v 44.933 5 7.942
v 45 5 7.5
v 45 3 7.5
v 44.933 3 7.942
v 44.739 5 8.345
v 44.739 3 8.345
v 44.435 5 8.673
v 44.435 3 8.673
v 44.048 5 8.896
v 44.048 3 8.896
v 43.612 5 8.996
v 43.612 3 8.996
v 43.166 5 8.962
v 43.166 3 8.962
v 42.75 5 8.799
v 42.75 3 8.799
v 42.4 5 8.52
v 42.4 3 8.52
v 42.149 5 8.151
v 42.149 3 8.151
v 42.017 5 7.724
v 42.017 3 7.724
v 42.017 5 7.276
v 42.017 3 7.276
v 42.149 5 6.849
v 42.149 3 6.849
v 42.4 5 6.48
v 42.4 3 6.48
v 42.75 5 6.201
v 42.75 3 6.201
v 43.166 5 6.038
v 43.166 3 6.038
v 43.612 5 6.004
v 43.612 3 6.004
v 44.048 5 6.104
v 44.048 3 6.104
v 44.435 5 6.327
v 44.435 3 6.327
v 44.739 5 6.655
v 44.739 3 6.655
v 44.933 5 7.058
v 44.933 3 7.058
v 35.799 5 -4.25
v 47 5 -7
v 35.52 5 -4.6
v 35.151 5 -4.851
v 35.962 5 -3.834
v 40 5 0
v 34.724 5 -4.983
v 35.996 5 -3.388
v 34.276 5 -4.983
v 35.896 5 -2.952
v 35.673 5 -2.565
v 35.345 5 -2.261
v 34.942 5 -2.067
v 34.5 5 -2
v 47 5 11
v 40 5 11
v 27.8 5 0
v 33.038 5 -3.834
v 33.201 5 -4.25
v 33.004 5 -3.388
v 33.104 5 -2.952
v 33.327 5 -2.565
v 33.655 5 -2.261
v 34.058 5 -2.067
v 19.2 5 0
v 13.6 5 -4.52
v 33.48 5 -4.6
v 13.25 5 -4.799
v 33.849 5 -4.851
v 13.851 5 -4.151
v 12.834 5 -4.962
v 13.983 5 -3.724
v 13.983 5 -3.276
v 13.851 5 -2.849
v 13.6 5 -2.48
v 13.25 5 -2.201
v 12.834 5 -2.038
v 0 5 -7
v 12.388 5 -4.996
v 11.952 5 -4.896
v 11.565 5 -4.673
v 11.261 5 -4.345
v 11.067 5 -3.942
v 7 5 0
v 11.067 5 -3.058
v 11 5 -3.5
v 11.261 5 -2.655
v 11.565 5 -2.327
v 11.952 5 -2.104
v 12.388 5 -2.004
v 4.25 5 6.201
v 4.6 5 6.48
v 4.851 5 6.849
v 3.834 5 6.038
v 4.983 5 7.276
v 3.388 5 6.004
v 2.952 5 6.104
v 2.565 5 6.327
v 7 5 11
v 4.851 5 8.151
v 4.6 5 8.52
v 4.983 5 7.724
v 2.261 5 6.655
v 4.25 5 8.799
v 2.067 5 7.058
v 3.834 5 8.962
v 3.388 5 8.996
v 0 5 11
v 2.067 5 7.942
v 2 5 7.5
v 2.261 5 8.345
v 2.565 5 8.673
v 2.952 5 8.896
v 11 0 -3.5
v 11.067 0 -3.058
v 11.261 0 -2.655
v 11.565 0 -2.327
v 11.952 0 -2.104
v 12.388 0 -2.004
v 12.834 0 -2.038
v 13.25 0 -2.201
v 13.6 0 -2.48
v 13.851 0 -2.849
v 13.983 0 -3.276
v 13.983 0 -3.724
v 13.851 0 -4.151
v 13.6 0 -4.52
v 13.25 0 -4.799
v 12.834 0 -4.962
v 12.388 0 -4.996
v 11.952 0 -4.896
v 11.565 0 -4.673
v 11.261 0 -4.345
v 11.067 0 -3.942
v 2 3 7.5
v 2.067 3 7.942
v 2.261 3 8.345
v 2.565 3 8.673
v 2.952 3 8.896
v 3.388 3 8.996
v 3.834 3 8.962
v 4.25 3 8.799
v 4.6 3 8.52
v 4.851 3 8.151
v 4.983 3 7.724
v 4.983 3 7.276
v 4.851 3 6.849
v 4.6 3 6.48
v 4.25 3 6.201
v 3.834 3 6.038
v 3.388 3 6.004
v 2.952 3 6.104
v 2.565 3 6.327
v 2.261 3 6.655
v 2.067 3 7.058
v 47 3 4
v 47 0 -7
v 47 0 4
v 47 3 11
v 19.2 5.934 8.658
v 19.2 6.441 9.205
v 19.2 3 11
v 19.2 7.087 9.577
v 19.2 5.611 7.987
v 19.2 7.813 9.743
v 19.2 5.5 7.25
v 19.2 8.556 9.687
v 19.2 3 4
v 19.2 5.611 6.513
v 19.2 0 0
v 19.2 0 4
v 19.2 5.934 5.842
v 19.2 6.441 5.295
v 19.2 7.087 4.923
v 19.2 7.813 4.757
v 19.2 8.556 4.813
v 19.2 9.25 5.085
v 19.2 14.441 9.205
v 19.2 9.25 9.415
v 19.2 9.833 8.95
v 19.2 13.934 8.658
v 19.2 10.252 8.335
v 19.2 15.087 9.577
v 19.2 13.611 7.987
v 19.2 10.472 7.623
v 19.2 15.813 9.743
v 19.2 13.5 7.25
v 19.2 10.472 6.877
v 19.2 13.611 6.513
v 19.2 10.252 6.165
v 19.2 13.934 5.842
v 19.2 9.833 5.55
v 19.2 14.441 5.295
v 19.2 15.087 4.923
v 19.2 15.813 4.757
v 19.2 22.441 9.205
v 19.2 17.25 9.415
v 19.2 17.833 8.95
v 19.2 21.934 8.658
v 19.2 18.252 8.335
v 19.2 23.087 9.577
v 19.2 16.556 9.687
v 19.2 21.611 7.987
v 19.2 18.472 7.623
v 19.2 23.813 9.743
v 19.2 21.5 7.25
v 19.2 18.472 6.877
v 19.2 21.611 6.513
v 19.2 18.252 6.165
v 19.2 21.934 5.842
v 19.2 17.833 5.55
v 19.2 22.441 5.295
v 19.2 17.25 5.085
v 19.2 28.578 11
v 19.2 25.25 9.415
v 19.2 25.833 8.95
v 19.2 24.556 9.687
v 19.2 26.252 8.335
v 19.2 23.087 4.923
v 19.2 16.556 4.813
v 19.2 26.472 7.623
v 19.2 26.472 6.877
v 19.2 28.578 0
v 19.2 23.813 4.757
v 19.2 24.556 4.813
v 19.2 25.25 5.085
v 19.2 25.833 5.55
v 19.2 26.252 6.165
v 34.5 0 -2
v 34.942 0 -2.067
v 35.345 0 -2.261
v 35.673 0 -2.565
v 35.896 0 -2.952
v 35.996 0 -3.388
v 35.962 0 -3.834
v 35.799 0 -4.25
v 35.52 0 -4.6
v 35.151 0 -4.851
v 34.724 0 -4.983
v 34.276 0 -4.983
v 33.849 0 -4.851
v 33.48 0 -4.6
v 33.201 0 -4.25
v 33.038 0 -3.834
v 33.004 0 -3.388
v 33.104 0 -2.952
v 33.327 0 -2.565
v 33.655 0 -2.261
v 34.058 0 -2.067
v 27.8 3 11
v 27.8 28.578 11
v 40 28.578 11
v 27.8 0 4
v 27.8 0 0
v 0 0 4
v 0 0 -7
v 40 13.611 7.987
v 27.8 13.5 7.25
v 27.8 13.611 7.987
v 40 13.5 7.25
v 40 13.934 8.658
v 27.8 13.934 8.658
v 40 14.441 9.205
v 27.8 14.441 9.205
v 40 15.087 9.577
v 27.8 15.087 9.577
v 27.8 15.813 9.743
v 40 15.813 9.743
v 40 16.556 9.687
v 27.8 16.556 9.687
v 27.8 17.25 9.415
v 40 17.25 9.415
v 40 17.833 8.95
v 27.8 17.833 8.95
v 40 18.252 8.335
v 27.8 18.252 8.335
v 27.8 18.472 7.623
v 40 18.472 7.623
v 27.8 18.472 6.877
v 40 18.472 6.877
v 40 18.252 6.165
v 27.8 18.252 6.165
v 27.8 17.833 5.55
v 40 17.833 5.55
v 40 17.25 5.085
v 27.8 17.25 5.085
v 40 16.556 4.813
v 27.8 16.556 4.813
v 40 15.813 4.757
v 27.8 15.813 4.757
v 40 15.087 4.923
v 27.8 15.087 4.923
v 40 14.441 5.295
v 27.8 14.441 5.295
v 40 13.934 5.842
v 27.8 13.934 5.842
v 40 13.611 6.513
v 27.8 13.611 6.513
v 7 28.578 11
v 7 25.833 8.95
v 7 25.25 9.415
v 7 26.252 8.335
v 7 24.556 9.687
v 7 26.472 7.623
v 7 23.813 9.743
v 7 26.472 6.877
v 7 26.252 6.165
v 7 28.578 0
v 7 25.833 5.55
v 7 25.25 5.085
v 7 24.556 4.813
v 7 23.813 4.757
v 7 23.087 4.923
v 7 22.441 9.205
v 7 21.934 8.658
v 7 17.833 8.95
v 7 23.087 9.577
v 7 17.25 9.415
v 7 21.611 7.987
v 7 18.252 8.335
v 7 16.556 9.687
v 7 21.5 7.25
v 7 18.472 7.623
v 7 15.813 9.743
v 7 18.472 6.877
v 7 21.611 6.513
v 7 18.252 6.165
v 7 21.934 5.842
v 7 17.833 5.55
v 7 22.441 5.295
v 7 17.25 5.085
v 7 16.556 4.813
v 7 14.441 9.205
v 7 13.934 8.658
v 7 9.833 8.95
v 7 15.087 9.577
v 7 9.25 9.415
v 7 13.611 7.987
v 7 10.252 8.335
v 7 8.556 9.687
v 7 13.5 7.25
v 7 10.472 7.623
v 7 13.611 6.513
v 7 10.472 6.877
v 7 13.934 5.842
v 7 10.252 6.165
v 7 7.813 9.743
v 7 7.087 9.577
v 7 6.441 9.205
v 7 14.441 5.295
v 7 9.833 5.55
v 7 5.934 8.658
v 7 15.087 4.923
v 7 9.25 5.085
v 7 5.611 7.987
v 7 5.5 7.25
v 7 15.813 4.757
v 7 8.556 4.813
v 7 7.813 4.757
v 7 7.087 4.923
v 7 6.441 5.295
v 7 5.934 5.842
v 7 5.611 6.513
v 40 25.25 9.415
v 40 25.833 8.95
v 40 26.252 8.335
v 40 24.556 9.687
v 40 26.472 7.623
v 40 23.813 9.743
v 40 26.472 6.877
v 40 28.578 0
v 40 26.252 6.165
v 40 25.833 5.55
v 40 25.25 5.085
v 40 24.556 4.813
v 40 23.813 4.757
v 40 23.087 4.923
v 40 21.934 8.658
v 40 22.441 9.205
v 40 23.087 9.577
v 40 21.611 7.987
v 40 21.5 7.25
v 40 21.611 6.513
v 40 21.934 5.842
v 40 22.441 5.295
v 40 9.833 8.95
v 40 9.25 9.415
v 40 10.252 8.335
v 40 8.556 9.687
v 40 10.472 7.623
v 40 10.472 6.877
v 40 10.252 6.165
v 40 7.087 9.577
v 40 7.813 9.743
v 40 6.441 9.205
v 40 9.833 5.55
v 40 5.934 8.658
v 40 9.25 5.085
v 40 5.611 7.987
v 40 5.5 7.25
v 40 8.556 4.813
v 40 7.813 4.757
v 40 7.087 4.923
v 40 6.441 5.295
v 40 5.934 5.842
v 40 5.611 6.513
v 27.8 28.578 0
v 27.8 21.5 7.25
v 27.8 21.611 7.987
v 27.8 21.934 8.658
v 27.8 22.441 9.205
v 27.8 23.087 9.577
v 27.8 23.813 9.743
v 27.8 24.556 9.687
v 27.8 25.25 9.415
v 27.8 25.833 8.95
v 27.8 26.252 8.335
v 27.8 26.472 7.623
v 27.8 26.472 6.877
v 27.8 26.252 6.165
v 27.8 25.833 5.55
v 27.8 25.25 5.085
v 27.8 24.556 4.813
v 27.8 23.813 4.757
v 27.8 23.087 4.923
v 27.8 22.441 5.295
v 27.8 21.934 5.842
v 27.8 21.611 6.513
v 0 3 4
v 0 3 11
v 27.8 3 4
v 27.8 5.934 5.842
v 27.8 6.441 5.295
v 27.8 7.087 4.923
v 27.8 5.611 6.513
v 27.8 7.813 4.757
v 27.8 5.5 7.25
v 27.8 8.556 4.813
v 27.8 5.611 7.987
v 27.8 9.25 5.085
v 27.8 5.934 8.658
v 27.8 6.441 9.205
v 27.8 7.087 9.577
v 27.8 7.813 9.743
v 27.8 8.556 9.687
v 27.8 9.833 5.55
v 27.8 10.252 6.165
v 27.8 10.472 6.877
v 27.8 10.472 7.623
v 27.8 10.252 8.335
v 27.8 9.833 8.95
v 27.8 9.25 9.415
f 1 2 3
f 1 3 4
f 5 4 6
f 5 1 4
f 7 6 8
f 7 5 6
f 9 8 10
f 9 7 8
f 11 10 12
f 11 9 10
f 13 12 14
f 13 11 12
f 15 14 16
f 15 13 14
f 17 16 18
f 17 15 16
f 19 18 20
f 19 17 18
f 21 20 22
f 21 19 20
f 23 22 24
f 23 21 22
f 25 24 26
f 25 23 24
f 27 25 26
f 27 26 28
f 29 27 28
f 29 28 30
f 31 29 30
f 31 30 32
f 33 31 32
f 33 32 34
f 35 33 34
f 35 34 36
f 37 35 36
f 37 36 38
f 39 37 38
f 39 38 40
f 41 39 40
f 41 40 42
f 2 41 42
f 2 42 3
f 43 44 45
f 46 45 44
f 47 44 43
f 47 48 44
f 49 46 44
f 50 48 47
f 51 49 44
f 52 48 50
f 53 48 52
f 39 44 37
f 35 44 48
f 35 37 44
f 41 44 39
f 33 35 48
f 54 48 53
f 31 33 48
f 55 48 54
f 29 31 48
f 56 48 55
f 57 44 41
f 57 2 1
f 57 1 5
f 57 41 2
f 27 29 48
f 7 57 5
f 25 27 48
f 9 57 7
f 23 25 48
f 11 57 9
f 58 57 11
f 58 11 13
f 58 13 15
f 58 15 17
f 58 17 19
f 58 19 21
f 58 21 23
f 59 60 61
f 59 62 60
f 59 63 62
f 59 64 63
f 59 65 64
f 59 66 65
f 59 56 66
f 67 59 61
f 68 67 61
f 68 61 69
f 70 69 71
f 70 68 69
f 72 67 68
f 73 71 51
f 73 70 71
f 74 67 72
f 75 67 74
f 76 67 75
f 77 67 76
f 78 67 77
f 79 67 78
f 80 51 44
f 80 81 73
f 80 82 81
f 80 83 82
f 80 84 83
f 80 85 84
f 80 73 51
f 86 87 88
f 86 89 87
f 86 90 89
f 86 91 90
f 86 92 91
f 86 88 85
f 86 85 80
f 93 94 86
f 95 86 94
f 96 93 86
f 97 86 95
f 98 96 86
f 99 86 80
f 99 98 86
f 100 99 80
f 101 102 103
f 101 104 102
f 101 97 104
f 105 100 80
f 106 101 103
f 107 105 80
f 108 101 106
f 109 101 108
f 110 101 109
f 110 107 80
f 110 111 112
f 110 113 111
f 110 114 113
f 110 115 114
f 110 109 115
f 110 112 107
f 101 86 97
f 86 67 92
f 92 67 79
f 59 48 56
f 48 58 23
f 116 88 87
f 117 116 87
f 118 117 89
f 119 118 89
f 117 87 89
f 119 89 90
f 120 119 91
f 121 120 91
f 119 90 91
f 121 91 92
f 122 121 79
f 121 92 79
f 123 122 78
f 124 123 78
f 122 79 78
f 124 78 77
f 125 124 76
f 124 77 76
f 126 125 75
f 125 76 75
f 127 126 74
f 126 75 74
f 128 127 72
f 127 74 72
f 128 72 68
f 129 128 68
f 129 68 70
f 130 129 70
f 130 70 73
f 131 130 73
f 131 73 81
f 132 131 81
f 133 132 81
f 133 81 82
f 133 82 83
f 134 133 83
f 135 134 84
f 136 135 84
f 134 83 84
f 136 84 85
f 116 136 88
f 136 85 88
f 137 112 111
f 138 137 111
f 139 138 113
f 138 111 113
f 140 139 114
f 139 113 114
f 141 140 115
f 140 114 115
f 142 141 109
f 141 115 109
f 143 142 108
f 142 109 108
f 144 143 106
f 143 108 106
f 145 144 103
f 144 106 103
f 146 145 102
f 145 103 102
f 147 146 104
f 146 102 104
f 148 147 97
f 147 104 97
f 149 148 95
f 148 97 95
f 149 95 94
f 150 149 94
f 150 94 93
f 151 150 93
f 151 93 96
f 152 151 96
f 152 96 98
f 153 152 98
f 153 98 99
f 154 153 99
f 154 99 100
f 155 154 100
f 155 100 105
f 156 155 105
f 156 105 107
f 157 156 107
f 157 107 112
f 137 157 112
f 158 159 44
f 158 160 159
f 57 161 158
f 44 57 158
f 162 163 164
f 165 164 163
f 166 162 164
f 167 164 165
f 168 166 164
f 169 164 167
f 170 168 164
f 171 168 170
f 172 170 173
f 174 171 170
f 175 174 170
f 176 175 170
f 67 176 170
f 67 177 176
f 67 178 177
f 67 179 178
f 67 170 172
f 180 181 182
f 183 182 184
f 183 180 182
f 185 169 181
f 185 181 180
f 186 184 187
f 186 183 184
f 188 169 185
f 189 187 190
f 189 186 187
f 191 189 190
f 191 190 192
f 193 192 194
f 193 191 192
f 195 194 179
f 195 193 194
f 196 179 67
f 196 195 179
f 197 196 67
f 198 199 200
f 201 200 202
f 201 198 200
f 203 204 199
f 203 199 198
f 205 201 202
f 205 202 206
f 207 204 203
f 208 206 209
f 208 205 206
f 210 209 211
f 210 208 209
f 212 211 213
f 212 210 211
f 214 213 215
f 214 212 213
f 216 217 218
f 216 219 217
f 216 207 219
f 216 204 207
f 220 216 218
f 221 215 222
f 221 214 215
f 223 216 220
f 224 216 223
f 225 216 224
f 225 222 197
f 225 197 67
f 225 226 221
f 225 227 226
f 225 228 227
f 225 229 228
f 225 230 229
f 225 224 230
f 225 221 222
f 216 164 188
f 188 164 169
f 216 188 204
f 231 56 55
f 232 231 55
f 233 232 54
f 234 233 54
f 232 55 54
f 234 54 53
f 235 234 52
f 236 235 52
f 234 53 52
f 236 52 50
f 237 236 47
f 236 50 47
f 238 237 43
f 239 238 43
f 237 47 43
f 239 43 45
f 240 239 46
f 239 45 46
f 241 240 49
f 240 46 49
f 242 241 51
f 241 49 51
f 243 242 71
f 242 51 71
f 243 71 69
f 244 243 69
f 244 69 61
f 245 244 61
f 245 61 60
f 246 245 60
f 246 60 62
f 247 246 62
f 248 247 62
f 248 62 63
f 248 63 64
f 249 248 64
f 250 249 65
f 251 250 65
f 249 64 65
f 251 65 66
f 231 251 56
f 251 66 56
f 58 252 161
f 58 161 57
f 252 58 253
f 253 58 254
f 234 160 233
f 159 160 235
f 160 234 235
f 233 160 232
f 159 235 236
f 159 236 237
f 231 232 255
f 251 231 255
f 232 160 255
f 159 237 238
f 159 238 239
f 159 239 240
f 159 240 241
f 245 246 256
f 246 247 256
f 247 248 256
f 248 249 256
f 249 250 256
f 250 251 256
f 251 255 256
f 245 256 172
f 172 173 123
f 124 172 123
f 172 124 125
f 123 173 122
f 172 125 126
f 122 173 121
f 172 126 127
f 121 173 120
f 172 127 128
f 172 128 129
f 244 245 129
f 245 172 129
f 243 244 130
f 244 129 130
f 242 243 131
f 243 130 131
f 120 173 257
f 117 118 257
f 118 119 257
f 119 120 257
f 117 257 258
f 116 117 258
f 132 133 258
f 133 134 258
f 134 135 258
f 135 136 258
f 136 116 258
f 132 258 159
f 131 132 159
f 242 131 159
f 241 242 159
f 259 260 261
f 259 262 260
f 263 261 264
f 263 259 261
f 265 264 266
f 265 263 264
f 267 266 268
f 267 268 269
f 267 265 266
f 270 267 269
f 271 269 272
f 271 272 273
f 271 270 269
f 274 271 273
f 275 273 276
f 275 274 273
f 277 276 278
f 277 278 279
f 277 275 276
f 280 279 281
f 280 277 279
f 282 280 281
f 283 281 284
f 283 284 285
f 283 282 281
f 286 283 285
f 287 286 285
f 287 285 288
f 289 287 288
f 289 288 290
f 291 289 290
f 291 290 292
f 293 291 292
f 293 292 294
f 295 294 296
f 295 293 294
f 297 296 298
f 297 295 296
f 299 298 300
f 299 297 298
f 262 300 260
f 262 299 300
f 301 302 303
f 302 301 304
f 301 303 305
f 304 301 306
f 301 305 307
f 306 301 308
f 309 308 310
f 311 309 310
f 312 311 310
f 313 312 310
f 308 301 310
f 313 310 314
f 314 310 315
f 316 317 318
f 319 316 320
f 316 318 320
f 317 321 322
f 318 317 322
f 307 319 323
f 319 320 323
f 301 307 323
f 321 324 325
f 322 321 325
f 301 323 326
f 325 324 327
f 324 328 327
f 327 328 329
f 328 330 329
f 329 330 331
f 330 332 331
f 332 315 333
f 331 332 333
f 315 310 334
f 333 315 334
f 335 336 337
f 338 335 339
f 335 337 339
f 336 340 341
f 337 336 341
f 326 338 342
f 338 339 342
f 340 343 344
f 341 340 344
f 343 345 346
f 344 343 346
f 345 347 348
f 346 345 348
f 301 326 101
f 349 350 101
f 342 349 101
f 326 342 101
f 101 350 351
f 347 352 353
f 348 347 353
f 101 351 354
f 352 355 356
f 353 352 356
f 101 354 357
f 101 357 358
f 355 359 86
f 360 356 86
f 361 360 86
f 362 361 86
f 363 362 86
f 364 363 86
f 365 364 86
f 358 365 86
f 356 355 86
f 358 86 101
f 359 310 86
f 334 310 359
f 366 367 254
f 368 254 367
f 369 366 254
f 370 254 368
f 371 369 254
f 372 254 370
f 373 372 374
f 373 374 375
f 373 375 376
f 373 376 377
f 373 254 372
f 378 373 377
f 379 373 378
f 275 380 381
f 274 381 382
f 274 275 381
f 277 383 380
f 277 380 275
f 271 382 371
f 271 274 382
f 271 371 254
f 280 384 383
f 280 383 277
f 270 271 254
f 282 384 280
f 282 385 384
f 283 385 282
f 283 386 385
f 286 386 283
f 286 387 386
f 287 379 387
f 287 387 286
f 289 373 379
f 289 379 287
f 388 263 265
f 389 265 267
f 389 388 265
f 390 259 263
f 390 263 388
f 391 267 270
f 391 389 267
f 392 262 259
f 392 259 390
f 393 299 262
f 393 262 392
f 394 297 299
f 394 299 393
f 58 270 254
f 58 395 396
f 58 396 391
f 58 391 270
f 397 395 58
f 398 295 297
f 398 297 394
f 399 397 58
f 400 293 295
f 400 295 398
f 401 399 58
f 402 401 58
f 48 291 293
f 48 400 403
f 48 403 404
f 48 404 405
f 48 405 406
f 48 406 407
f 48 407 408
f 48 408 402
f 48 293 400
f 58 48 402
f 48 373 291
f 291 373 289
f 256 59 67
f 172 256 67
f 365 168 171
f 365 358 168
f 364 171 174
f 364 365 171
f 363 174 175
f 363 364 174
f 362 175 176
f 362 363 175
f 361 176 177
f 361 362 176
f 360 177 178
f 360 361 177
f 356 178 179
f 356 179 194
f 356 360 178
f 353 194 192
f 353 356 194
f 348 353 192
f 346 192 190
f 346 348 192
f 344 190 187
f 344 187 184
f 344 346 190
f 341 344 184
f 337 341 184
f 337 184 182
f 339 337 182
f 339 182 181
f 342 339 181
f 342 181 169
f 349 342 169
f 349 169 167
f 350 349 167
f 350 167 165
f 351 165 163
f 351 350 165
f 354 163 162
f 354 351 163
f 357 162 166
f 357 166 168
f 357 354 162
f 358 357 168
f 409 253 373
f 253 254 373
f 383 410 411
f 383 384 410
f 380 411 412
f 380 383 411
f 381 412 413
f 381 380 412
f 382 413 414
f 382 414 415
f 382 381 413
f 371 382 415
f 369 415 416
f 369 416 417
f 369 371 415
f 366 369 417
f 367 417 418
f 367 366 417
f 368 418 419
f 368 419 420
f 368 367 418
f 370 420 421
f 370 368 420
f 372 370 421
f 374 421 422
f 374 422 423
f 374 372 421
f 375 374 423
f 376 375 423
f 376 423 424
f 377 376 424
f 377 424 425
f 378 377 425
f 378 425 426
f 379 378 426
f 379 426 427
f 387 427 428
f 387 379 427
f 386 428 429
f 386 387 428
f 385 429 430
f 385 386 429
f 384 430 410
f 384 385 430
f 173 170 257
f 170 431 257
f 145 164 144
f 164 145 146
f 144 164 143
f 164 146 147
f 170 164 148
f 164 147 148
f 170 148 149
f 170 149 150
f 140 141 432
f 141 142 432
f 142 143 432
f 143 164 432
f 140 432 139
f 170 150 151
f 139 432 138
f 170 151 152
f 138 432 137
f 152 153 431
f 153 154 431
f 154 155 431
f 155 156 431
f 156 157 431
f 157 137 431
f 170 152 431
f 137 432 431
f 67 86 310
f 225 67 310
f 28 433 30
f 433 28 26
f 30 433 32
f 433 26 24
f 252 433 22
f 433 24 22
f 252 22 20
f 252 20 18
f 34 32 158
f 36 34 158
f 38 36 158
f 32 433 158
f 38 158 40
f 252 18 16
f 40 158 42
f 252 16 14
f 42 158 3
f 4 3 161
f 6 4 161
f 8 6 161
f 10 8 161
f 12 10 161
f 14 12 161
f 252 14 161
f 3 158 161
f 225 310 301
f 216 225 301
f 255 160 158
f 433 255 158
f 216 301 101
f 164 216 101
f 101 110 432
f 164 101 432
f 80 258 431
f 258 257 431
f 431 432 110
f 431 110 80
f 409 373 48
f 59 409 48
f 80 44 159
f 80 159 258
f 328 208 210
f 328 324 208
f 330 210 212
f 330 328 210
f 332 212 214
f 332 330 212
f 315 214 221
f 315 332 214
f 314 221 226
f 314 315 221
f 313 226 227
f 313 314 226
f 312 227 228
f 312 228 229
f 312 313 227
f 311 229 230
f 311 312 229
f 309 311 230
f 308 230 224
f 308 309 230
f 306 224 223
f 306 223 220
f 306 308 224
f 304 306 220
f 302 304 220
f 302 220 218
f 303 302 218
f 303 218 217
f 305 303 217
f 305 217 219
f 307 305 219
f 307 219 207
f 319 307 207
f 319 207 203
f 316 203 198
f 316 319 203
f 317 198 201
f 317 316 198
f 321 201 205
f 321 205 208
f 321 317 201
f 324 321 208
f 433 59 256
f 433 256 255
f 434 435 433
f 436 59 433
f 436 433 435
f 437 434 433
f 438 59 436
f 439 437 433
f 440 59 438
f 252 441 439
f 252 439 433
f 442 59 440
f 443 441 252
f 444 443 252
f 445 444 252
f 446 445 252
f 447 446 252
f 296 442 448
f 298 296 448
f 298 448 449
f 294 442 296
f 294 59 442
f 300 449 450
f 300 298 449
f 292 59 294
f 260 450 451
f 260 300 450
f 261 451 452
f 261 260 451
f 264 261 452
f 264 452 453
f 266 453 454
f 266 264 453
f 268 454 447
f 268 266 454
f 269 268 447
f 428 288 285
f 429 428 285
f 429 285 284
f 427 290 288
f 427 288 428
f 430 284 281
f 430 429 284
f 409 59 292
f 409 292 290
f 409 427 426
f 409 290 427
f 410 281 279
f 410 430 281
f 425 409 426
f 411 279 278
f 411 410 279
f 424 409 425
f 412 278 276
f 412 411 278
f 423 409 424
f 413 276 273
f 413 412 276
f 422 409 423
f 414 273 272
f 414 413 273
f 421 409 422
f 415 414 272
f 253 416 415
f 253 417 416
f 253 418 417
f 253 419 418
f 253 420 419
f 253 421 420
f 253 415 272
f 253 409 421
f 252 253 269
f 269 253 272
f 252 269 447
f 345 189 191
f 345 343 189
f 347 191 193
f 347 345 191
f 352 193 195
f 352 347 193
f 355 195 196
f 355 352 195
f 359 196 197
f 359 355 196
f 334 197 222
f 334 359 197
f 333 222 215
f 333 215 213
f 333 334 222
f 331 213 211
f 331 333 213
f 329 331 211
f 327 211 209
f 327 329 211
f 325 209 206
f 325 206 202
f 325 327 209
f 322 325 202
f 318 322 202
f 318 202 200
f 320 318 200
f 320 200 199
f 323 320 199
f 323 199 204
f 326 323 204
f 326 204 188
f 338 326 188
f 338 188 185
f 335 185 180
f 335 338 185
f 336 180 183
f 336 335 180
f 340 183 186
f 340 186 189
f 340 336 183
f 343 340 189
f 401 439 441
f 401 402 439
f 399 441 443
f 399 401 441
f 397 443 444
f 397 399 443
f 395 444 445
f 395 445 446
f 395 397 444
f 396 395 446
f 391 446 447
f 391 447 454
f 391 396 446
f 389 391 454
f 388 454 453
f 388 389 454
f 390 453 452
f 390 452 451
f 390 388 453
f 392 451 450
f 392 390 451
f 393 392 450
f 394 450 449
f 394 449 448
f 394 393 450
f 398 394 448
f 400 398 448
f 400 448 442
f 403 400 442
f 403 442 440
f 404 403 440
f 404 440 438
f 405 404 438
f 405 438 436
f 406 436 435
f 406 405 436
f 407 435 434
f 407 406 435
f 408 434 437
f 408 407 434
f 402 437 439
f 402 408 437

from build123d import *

# Parameters (mm, degrees)
BOSS_EXTRUDE1_DEPTH = 11
CUT_EXTRUDE1_REACH  = 37.52
SKETCH3_W           = 7
SKETCH3_H           = 3
CUT_EXTRUDE2_REACH  = 34.538
SKETCH4_R           = 2.5
SKETCH5_R           = 1.5
CUT_EXTRUDE3_DEPTH  = 11
SKETCH6_W           = 47
SKETCH6_H           = 5
BOSS_EXTRUDE2_DEPTH = 7
SKETCH7_R           = 1.5
CUT_EXTRUDE4_DEPTH  = 5
SKETCH9_R           = 2.5
BOSS_EXTRUDE3_DEPTH = 1.2
SKETCH10_R          = 2.5
BOSS_EXTRUDE4_DEPTH = 1.2


with BuildPart() as part:
    # Sketch1 → Boss-Extrude1 (new body)
    with BuildSketch(Plane.XY):
        Polygon((0, 0), (18, 0), (18, 28.578), (7, 28.578), (7, 5), (0, 5), align=None)
    extrude(amount=BOSS_EXTRUDE1_DEPTH)

    # Sketch3 → Cut-Extrude1 (cut, up to next)
    with BuildSketch(Plane.ZY, mode=Mode.PRIVATE) as cut_extrude1_sk1:
        with Locations((7.5, 1.5)):
            Rectangle(SKETCH3_W, SKETCH3_H)
    cut_extrude1_tool1 = extrude(cut_extrude1_sk1.sketch, amount=-CUT_EXTRUDE1_REACH, mode=Mode.PRIVATE) & part.part
    add(cut_extrude1_tool1.solids().sort_by_distance((0, 1.5, 7.5))[0], mode=Mode.SUBTRACT)

    # Sketch4 → Cut-Extrude2 (cut, up to next)
    with BuildSketch(Plane.ZY.offset(-7), mode=Mode.PRIVATE) as cut_extrude2_sk1:
        with Locations(Location((7.25, 8, 0), (0, 0, 270))):
            Circle(SKETCH4_R)
    cut_extrude2_tool1 = extrude(cut_extrude2_sk1.sketch, amount=-CUT_EXTRUDE2_REACH, mode=Mode.PRIVATE) & part.part
    # Sketch4 → Cut-Extrude2 (cut, up to next)
    with BuildSketch(Plane.ZY.offset(-7), mode=Mode.PRIVATE) as cut_extrude2_sk2:
        with Locations(Location((7.25, 16, 0), (0, 0, 270))):
            Circle(SKETCH4_R)
    cut_extrude2_tool2 = extrude(cut_extrude2_sk2.sketch, amount=-CUT_EXTRUDE2_REACH, mode=Mode.PRIVATE) & part.part
    # Sketch4 → Cut-Extrude2 (cut, up to next)
    with BuildSketch(Plane.ZY.offset(-7), mode=Mode.PRIVATE) as cut_extrude2_sk3:
        with Locations(Location((7.25, 24, 0), (0, 0, 270))):
            Circle(SKETCH4_R)
    cut_extrude2_tool3 = extrude(cut_extrude2_sk3.sketch, amount=-CUT_EXTRUDE2_REACH, mode=Mode.PRIVATE) & part.part
    add(cut_extrude2_tool1.solids().sort_by_distance((7, 8, 7.25))[0], mode=Mode.SUBTRACT)
    add(cut_extrude2_tool2.solids().sort_by_distance((7, 16, 7.25))[0], mode=Mode.SUBTRACT)
    add(cut_extrude2_tool3.solids().sort_by_distance((7, 24, 7.25))[0], mode=Mode.SUBTRACT)

    # Sketch5 → Cut-Extrude3 (cut)
    with BuildSketch(Plane(origin=(0, 5, 0), x_dir=(1, 0, 0), z_dir=(0, 1, 0))):
        with Locations(Location((3.5, -7.5, 0), (0, 0, 180))):
            Circle(SKETCH5_R)
    extrude(amount=-CUT_EXTRUDE3_DEPTH, mode=Mode.SUBTRACT)


with BuildPart() as body_2:
    # Mirror6: mirrored copy
    add(part.part.mirror(Plane(origin=(23.5, 0, 0), x_dir=(0, 0, 1), z_dir=(1, 0, 0))))


with BuildPart() as part_1:
    add(part.part)

    add(body_2.part)  # Boss-Extrude2 merges body 2
    # Sketch6 → Boss-Extrude2 (add)
    with BuildSketch(Plane(origin=(0, 0, 0), x_dir=(-1, 0, 0), z_dir=(0, 0, -1))):
        with Locations((-23.5, 2.5)):
            Rectangle(SKETCH6_W, SKETCH6_H)
    extrude(amount=BOSS_EXTRUDE2_DEPTH)

    # Sketch7 → Cut-Extrude4 (cut)
    with BuildSketch(Plane(origin=(0, 5, 0), x_dir=(1, 0, 0), z_dir=(0, 1, 0))):
        with Locations(Location((12.5, 3.5, 0), (0, 0, 180))):
            Circle(SKETCH7_R)
        with Locations(Location((34.5, 3.5, 0), (0, 0, 270))):
            Circle(SKETCH7_R)
    extrude(amount=-CUT_EXTRUDE4_DEPTH, mode=Mode.SUBTRACT)

    # Sketch9 → Boss-Extrude3 (add)
    with BuildSketch(Plane.ZY.offset(-29)):
        Polygon((11, 3), (11, 28.578), (0, 28.578), (0, 5), (0, 0), (4, 0), (4, 3), align=None)
        with Locations(Location((7.25, 24, 0), (0, 0, 270))):
            Circle(SKETCH9_R, mode=Mode.SUBTRACT)
        with Locations(Location((7.25, 16, 0), (0, 0, 270))):
            Circle(SKETCH9_R, mode=Mode.SUBTRACT)
        with Locations(Location((7.25, 8, 0), (0, 0, 270))):
            Circle(SKETCH9_R, mode=Mode.SUBTRACT)
    extrude(amount=BOSS_EXTRUDE3_DEPTH)

    # Sketch10 → Boss-Extrude4 (add)
    with BuildSketch(Plane(origin=(18, 0, 0), x_dir=(0, 0, -1), z_dir=(1, 0, 0))):
        Polygon((-11, 28.578), (-11, 3), (-4, 3), (-4, 0), (0, 0), (0, 5), (0, 28.578), align=None)
        with Locations(Location((-7.25, 8, 0), (0, 0, 270))):
            Circle(SKETCH10_R, mode=Mode.SUBTRACT)
        with Locations(Location((-7.25, 16, 0), (0, 0, 270))):
            Circle(SKETCH10_R, mode=Mode.SUBTRACT)
        with Locations(Location((-7.25, 24, 0), (0, 0, 270))):
            Circle(SKETCH10_R, mode=Mode.SUBTRACT)
    extrude(amount=BOSS_EXTRUDE4_DEPTH)


solid = part_1.part
